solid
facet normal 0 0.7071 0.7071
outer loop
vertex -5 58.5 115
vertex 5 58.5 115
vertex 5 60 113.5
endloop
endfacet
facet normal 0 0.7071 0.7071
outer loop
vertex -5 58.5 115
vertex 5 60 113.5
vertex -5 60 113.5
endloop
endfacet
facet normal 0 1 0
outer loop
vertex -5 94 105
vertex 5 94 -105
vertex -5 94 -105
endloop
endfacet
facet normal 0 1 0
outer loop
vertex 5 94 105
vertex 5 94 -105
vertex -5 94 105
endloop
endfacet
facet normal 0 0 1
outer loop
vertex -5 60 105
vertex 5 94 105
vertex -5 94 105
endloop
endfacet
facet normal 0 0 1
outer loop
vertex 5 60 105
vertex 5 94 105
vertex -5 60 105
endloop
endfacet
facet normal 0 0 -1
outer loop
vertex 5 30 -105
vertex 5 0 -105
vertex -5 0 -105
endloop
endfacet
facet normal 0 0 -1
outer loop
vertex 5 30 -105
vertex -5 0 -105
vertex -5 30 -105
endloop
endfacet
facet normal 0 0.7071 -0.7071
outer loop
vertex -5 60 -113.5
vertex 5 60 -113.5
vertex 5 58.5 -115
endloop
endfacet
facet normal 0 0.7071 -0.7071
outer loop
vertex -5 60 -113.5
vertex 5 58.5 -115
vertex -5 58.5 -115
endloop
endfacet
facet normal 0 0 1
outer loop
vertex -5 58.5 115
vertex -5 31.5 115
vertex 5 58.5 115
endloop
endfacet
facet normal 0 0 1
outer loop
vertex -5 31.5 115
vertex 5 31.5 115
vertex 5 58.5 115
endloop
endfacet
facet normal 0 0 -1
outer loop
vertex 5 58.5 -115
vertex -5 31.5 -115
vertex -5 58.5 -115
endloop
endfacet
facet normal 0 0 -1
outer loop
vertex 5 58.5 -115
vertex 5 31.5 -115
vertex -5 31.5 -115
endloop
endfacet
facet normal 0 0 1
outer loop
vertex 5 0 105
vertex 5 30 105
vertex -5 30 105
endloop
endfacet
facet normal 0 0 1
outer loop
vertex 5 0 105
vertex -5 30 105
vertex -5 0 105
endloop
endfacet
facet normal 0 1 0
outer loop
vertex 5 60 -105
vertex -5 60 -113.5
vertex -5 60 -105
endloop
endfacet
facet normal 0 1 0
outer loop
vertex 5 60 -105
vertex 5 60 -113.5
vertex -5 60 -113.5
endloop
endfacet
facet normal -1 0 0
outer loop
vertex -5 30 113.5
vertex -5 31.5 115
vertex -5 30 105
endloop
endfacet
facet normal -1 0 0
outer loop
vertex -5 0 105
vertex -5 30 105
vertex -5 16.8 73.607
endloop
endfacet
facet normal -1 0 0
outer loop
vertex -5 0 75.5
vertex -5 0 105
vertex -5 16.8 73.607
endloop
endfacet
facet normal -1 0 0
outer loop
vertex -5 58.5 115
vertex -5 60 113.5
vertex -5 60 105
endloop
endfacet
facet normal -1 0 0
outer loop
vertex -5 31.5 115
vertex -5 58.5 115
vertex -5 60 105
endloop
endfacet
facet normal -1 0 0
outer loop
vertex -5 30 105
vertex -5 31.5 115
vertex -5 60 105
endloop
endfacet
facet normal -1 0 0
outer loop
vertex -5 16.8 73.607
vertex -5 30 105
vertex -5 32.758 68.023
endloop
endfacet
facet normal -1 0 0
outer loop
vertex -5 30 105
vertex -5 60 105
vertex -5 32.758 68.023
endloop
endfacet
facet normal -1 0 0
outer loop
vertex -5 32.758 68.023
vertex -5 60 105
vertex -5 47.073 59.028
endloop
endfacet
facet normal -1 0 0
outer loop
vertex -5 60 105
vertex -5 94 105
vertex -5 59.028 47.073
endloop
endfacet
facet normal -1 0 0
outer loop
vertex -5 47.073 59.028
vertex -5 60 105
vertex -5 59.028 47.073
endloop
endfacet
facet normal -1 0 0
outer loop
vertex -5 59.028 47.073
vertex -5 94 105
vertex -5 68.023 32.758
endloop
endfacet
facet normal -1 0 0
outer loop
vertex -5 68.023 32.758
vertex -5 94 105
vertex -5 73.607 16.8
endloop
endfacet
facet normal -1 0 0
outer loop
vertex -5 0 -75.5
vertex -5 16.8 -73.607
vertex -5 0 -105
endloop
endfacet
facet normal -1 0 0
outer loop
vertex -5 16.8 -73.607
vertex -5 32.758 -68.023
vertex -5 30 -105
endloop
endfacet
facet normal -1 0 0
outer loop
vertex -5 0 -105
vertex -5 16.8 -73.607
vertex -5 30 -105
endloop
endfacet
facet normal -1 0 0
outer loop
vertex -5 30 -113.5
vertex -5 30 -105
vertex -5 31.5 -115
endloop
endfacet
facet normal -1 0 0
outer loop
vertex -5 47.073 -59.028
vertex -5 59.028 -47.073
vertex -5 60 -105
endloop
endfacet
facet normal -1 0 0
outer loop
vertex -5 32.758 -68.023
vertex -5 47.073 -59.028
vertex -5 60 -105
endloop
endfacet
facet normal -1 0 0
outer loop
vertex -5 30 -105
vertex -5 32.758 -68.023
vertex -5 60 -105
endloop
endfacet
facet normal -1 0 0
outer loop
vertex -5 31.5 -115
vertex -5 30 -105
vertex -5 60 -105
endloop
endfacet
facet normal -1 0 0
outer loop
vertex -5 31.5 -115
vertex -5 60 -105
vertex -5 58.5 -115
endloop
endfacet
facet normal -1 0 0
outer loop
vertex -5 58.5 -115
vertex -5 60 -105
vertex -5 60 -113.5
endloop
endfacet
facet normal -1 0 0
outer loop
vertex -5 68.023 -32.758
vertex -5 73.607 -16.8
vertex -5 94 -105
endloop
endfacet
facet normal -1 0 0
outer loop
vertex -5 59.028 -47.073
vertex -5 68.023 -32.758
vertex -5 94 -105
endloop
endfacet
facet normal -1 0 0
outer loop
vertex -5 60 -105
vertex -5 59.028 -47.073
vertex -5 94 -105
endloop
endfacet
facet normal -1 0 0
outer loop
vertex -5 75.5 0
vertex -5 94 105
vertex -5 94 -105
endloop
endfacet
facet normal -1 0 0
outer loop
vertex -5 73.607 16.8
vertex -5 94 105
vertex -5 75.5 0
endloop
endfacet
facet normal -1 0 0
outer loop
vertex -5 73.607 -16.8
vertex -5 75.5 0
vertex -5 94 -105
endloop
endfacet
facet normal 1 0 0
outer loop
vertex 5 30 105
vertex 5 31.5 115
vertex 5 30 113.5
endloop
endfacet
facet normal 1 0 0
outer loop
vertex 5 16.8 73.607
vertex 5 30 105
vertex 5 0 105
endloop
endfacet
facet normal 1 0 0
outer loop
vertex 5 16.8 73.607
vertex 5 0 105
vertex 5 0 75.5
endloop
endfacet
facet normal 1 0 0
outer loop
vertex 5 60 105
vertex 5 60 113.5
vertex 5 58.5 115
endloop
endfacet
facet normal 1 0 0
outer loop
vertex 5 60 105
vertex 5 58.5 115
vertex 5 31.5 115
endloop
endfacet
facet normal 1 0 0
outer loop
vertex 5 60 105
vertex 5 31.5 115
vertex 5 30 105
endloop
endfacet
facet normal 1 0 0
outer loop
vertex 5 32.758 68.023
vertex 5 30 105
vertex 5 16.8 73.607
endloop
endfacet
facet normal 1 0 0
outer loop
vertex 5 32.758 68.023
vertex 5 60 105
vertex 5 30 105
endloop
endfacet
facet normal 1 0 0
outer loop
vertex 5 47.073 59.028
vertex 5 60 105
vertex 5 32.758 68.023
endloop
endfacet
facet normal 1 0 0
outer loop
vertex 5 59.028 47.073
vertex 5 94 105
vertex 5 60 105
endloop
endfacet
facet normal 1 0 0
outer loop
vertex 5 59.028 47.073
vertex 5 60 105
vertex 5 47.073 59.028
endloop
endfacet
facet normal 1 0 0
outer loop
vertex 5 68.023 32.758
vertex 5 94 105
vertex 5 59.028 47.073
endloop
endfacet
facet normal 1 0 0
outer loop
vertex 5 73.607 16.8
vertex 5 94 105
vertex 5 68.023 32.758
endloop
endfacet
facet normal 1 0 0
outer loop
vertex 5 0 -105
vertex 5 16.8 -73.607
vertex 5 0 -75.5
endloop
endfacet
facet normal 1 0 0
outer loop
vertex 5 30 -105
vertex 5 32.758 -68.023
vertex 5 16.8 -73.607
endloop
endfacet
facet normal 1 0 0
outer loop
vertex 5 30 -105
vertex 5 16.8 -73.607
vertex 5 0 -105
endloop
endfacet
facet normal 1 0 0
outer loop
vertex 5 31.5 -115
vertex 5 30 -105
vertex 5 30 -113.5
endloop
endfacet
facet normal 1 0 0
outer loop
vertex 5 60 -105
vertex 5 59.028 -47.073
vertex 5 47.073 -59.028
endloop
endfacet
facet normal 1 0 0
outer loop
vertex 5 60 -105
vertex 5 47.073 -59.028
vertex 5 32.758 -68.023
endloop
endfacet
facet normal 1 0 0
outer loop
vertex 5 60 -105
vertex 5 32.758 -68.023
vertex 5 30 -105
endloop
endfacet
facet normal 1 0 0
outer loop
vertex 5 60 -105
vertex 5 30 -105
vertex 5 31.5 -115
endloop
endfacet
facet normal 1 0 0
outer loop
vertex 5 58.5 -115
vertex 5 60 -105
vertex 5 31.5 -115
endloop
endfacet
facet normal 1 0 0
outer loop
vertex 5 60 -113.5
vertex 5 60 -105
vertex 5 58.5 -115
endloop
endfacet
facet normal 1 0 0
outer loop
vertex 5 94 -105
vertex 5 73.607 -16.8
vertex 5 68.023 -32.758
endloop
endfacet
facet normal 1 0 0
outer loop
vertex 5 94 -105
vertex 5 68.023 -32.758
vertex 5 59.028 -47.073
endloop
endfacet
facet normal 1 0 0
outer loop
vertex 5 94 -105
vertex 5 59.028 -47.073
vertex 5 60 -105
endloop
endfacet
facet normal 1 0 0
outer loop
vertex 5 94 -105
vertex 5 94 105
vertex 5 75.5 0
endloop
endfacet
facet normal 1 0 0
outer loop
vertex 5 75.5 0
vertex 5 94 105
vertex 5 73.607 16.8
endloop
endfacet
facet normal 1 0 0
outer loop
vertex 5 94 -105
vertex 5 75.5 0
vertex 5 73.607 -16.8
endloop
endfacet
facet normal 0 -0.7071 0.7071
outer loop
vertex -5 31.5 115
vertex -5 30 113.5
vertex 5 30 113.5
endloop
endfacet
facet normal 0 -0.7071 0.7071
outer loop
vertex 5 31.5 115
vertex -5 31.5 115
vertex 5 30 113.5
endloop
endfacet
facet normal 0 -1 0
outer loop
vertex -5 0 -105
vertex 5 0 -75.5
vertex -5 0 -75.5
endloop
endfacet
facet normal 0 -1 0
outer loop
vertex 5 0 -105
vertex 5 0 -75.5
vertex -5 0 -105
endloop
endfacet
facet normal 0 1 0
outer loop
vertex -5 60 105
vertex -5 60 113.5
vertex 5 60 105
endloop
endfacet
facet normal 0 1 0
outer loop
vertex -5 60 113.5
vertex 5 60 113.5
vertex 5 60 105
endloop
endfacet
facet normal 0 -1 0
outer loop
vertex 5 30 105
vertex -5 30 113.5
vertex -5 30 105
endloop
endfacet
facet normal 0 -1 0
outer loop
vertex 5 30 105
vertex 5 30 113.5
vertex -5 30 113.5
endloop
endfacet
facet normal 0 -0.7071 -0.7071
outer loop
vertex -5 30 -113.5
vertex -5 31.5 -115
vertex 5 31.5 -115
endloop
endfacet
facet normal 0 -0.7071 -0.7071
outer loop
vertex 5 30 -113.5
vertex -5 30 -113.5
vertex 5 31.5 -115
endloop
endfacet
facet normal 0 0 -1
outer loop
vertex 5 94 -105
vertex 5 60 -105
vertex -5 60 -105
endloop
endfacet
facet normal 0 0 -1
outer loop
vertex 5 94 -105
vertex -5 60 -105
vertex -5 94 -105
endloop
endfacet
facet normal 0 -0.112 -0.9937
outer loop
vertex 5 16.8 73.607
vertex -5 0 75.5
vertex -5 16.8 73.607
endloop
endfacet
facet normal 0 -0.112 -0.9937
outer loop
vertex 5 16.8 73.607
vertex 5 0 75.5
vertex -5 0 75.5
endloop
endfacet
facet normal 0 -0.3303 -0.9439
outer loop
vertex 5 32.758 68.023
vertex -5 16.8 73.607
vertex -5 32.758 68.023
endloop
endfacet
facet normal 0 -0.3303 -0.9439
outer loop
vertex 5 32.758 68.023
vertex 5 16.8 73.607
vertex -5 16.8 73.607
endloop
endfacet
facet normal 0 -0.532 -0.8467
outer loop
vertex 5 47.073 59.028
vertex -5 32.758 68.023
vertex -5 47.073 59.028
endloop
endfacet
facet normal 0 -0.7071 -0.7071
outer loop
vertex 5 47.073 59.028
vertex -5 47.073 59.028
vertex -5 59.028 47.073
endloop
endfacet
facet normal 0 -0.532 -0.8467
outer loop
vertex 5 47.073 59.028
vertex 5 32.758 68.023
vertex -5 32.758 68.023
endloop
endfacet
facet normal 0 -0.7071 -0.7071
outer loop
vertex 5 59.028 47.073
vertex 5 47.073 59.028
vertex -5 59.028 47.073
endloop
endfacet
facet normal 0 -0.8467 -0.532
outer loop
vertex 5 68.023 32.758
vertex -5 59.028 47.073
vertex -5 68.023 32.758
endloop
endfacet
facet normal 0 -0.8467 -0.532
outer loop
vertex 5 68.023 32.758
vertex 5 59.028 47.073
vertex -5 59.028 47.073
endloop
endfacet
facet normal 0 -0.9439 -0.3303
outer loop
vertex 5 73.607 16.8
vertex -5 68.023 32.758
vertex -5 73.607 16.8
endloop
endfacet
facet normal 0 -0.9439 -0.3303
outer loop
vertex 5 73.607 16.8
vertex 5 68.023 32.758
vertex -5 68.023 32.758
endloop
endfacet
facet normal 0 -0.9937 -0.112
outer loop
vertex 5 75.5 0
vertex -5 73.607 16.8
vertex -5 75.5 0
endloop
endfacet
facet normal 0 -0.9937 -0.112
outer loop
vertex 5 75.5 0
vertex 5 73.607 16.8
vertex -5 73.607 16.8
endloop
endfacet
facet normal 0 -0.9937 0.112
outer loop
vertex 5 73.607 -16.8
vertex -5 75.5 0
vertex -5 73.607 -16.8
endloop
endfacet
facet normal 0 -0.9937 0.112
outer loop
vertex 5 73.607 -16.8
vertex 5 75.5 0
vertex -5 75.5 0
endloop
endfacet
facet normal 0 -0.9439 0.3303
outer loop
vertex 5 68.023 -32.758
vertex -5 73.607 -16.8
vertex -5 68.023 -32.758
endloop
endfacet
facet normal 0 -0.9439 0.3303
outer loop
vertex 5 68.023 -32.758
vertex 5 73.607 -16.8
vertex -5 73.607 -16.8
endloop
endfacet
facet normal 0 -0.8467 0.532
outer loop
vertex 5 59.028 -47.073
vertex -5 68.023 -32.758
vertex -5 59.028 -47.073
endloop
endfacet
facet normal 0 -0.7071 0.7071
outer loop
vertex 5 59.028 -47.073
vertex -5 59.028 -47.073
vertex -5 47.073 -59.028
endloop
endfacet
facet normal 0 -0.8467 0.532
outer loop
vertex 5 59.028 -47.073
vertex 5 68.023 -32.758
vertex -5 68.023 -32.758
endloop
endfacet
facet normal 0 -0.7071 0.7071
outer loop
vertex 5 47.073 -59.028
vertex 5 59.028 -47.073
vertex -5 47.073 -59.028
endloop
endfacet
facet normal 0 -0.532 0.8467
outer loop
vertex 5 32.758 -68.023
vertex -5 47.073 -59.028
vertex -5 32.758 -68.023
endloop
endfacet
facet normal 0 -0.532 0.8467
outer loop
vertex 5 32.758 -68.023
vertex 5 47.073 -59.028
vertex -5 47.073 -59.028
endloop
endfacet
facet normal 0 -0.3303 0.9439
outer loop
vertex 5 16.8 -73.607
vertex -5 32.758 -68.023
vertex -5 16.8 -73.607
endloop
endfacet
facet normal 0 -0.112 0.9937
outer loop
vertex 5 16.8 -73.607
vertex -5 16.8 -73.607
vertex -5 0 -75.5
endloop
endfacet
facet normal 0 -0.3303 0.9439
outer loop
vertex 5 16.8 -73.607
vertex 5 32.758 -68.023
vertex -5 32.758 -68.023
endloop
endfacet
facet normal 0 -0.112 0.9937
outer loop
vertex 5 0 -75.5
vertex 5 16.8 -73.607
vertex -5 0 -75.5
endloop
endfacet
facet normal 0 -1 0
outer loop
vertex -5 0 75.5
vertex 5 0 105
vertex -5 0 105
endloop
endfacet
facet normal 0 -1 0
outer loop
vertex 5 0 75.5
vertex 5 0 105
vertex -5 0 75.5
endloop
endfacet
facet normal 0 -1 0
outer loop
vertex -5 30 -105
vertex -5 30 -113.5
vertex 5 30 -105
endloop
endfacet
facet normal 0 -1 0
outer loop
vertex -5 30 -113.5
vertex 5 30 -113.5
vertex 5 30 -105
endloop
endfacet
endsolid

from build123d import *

# Parameters (mm, degrees)
EXTRUDE_583_DEPTH              = 5
SKETCH_2_W                     = 10
SKETCH_2_H                     = 30
EXTRUDE_642_DEPTH              = 5
CHAMFER_690_SIZE               = 1.5
CHAMFER_690_OF_MIRROR_757_SIZE = 1.5


with BuildPart() as part:
    # ｽｹｯﾁ1 → Extrude 583 (new, symmetric)
    with BuildSketch(Plane(origin=(0, 0, 0), x_dir=(0, 0, -1), z_dir=(1, 0, 0))):
        with BuildLine():
            Line((75.5, 0), (105, 0))
            Line((105, 0), (105, 94))
            Line((105, 94), (-105, 94))
            Line((-105, 94), (-105, 0))
            Line((-105, 0), (-75.5, 0))
            ThreePointArc((-75.5, 0), (0, 75.5), (75.5, 0))
        make_face()
    extrude(amount=EXTRUDE_583_DEPTH, both=True)

    # ｽｹｯﾁ2 → Extrude 642 (add, symmetric)
    with BuildSketch(Plane(origin=(0, 0, 0), x_dir=(0, 0, -1), z_dir=(1, 0, 0))):
        with Locations((-110, 45)):
            Rectangle(SKETCH_2_W, SKETCH_2_H)
    extrude_642 = extrude(amount=EXTRUDE_642_DEPTH, both=True)

    # Chamfer 690
    chamfer_690_edges = [part.edges().sort_by_distance(p)[0] for p in [
        (0, 60, 115),
        (0, 30, 115),
    ]]
    chamfer(chamfer_690_edges, length=CHAMFER_690_SIZE)

    # Mirror 757: Extrude 642 across plane
    add(extrude_642.mirror(Plane.XY))

    # Chamfer 690 of Mirror 757
    chamfer_690_of_mirror_757_edges = [part.edges().sort_by_distance(p)[0] for p in [
        (0, 60, -115),
        (0, 30, -115),
    ]]
    chamfer(chamfer_690_of_mirror_757_edges, length=CHAMFER_690_OF_MIRROR_757_SIZE)


solid = part.part
